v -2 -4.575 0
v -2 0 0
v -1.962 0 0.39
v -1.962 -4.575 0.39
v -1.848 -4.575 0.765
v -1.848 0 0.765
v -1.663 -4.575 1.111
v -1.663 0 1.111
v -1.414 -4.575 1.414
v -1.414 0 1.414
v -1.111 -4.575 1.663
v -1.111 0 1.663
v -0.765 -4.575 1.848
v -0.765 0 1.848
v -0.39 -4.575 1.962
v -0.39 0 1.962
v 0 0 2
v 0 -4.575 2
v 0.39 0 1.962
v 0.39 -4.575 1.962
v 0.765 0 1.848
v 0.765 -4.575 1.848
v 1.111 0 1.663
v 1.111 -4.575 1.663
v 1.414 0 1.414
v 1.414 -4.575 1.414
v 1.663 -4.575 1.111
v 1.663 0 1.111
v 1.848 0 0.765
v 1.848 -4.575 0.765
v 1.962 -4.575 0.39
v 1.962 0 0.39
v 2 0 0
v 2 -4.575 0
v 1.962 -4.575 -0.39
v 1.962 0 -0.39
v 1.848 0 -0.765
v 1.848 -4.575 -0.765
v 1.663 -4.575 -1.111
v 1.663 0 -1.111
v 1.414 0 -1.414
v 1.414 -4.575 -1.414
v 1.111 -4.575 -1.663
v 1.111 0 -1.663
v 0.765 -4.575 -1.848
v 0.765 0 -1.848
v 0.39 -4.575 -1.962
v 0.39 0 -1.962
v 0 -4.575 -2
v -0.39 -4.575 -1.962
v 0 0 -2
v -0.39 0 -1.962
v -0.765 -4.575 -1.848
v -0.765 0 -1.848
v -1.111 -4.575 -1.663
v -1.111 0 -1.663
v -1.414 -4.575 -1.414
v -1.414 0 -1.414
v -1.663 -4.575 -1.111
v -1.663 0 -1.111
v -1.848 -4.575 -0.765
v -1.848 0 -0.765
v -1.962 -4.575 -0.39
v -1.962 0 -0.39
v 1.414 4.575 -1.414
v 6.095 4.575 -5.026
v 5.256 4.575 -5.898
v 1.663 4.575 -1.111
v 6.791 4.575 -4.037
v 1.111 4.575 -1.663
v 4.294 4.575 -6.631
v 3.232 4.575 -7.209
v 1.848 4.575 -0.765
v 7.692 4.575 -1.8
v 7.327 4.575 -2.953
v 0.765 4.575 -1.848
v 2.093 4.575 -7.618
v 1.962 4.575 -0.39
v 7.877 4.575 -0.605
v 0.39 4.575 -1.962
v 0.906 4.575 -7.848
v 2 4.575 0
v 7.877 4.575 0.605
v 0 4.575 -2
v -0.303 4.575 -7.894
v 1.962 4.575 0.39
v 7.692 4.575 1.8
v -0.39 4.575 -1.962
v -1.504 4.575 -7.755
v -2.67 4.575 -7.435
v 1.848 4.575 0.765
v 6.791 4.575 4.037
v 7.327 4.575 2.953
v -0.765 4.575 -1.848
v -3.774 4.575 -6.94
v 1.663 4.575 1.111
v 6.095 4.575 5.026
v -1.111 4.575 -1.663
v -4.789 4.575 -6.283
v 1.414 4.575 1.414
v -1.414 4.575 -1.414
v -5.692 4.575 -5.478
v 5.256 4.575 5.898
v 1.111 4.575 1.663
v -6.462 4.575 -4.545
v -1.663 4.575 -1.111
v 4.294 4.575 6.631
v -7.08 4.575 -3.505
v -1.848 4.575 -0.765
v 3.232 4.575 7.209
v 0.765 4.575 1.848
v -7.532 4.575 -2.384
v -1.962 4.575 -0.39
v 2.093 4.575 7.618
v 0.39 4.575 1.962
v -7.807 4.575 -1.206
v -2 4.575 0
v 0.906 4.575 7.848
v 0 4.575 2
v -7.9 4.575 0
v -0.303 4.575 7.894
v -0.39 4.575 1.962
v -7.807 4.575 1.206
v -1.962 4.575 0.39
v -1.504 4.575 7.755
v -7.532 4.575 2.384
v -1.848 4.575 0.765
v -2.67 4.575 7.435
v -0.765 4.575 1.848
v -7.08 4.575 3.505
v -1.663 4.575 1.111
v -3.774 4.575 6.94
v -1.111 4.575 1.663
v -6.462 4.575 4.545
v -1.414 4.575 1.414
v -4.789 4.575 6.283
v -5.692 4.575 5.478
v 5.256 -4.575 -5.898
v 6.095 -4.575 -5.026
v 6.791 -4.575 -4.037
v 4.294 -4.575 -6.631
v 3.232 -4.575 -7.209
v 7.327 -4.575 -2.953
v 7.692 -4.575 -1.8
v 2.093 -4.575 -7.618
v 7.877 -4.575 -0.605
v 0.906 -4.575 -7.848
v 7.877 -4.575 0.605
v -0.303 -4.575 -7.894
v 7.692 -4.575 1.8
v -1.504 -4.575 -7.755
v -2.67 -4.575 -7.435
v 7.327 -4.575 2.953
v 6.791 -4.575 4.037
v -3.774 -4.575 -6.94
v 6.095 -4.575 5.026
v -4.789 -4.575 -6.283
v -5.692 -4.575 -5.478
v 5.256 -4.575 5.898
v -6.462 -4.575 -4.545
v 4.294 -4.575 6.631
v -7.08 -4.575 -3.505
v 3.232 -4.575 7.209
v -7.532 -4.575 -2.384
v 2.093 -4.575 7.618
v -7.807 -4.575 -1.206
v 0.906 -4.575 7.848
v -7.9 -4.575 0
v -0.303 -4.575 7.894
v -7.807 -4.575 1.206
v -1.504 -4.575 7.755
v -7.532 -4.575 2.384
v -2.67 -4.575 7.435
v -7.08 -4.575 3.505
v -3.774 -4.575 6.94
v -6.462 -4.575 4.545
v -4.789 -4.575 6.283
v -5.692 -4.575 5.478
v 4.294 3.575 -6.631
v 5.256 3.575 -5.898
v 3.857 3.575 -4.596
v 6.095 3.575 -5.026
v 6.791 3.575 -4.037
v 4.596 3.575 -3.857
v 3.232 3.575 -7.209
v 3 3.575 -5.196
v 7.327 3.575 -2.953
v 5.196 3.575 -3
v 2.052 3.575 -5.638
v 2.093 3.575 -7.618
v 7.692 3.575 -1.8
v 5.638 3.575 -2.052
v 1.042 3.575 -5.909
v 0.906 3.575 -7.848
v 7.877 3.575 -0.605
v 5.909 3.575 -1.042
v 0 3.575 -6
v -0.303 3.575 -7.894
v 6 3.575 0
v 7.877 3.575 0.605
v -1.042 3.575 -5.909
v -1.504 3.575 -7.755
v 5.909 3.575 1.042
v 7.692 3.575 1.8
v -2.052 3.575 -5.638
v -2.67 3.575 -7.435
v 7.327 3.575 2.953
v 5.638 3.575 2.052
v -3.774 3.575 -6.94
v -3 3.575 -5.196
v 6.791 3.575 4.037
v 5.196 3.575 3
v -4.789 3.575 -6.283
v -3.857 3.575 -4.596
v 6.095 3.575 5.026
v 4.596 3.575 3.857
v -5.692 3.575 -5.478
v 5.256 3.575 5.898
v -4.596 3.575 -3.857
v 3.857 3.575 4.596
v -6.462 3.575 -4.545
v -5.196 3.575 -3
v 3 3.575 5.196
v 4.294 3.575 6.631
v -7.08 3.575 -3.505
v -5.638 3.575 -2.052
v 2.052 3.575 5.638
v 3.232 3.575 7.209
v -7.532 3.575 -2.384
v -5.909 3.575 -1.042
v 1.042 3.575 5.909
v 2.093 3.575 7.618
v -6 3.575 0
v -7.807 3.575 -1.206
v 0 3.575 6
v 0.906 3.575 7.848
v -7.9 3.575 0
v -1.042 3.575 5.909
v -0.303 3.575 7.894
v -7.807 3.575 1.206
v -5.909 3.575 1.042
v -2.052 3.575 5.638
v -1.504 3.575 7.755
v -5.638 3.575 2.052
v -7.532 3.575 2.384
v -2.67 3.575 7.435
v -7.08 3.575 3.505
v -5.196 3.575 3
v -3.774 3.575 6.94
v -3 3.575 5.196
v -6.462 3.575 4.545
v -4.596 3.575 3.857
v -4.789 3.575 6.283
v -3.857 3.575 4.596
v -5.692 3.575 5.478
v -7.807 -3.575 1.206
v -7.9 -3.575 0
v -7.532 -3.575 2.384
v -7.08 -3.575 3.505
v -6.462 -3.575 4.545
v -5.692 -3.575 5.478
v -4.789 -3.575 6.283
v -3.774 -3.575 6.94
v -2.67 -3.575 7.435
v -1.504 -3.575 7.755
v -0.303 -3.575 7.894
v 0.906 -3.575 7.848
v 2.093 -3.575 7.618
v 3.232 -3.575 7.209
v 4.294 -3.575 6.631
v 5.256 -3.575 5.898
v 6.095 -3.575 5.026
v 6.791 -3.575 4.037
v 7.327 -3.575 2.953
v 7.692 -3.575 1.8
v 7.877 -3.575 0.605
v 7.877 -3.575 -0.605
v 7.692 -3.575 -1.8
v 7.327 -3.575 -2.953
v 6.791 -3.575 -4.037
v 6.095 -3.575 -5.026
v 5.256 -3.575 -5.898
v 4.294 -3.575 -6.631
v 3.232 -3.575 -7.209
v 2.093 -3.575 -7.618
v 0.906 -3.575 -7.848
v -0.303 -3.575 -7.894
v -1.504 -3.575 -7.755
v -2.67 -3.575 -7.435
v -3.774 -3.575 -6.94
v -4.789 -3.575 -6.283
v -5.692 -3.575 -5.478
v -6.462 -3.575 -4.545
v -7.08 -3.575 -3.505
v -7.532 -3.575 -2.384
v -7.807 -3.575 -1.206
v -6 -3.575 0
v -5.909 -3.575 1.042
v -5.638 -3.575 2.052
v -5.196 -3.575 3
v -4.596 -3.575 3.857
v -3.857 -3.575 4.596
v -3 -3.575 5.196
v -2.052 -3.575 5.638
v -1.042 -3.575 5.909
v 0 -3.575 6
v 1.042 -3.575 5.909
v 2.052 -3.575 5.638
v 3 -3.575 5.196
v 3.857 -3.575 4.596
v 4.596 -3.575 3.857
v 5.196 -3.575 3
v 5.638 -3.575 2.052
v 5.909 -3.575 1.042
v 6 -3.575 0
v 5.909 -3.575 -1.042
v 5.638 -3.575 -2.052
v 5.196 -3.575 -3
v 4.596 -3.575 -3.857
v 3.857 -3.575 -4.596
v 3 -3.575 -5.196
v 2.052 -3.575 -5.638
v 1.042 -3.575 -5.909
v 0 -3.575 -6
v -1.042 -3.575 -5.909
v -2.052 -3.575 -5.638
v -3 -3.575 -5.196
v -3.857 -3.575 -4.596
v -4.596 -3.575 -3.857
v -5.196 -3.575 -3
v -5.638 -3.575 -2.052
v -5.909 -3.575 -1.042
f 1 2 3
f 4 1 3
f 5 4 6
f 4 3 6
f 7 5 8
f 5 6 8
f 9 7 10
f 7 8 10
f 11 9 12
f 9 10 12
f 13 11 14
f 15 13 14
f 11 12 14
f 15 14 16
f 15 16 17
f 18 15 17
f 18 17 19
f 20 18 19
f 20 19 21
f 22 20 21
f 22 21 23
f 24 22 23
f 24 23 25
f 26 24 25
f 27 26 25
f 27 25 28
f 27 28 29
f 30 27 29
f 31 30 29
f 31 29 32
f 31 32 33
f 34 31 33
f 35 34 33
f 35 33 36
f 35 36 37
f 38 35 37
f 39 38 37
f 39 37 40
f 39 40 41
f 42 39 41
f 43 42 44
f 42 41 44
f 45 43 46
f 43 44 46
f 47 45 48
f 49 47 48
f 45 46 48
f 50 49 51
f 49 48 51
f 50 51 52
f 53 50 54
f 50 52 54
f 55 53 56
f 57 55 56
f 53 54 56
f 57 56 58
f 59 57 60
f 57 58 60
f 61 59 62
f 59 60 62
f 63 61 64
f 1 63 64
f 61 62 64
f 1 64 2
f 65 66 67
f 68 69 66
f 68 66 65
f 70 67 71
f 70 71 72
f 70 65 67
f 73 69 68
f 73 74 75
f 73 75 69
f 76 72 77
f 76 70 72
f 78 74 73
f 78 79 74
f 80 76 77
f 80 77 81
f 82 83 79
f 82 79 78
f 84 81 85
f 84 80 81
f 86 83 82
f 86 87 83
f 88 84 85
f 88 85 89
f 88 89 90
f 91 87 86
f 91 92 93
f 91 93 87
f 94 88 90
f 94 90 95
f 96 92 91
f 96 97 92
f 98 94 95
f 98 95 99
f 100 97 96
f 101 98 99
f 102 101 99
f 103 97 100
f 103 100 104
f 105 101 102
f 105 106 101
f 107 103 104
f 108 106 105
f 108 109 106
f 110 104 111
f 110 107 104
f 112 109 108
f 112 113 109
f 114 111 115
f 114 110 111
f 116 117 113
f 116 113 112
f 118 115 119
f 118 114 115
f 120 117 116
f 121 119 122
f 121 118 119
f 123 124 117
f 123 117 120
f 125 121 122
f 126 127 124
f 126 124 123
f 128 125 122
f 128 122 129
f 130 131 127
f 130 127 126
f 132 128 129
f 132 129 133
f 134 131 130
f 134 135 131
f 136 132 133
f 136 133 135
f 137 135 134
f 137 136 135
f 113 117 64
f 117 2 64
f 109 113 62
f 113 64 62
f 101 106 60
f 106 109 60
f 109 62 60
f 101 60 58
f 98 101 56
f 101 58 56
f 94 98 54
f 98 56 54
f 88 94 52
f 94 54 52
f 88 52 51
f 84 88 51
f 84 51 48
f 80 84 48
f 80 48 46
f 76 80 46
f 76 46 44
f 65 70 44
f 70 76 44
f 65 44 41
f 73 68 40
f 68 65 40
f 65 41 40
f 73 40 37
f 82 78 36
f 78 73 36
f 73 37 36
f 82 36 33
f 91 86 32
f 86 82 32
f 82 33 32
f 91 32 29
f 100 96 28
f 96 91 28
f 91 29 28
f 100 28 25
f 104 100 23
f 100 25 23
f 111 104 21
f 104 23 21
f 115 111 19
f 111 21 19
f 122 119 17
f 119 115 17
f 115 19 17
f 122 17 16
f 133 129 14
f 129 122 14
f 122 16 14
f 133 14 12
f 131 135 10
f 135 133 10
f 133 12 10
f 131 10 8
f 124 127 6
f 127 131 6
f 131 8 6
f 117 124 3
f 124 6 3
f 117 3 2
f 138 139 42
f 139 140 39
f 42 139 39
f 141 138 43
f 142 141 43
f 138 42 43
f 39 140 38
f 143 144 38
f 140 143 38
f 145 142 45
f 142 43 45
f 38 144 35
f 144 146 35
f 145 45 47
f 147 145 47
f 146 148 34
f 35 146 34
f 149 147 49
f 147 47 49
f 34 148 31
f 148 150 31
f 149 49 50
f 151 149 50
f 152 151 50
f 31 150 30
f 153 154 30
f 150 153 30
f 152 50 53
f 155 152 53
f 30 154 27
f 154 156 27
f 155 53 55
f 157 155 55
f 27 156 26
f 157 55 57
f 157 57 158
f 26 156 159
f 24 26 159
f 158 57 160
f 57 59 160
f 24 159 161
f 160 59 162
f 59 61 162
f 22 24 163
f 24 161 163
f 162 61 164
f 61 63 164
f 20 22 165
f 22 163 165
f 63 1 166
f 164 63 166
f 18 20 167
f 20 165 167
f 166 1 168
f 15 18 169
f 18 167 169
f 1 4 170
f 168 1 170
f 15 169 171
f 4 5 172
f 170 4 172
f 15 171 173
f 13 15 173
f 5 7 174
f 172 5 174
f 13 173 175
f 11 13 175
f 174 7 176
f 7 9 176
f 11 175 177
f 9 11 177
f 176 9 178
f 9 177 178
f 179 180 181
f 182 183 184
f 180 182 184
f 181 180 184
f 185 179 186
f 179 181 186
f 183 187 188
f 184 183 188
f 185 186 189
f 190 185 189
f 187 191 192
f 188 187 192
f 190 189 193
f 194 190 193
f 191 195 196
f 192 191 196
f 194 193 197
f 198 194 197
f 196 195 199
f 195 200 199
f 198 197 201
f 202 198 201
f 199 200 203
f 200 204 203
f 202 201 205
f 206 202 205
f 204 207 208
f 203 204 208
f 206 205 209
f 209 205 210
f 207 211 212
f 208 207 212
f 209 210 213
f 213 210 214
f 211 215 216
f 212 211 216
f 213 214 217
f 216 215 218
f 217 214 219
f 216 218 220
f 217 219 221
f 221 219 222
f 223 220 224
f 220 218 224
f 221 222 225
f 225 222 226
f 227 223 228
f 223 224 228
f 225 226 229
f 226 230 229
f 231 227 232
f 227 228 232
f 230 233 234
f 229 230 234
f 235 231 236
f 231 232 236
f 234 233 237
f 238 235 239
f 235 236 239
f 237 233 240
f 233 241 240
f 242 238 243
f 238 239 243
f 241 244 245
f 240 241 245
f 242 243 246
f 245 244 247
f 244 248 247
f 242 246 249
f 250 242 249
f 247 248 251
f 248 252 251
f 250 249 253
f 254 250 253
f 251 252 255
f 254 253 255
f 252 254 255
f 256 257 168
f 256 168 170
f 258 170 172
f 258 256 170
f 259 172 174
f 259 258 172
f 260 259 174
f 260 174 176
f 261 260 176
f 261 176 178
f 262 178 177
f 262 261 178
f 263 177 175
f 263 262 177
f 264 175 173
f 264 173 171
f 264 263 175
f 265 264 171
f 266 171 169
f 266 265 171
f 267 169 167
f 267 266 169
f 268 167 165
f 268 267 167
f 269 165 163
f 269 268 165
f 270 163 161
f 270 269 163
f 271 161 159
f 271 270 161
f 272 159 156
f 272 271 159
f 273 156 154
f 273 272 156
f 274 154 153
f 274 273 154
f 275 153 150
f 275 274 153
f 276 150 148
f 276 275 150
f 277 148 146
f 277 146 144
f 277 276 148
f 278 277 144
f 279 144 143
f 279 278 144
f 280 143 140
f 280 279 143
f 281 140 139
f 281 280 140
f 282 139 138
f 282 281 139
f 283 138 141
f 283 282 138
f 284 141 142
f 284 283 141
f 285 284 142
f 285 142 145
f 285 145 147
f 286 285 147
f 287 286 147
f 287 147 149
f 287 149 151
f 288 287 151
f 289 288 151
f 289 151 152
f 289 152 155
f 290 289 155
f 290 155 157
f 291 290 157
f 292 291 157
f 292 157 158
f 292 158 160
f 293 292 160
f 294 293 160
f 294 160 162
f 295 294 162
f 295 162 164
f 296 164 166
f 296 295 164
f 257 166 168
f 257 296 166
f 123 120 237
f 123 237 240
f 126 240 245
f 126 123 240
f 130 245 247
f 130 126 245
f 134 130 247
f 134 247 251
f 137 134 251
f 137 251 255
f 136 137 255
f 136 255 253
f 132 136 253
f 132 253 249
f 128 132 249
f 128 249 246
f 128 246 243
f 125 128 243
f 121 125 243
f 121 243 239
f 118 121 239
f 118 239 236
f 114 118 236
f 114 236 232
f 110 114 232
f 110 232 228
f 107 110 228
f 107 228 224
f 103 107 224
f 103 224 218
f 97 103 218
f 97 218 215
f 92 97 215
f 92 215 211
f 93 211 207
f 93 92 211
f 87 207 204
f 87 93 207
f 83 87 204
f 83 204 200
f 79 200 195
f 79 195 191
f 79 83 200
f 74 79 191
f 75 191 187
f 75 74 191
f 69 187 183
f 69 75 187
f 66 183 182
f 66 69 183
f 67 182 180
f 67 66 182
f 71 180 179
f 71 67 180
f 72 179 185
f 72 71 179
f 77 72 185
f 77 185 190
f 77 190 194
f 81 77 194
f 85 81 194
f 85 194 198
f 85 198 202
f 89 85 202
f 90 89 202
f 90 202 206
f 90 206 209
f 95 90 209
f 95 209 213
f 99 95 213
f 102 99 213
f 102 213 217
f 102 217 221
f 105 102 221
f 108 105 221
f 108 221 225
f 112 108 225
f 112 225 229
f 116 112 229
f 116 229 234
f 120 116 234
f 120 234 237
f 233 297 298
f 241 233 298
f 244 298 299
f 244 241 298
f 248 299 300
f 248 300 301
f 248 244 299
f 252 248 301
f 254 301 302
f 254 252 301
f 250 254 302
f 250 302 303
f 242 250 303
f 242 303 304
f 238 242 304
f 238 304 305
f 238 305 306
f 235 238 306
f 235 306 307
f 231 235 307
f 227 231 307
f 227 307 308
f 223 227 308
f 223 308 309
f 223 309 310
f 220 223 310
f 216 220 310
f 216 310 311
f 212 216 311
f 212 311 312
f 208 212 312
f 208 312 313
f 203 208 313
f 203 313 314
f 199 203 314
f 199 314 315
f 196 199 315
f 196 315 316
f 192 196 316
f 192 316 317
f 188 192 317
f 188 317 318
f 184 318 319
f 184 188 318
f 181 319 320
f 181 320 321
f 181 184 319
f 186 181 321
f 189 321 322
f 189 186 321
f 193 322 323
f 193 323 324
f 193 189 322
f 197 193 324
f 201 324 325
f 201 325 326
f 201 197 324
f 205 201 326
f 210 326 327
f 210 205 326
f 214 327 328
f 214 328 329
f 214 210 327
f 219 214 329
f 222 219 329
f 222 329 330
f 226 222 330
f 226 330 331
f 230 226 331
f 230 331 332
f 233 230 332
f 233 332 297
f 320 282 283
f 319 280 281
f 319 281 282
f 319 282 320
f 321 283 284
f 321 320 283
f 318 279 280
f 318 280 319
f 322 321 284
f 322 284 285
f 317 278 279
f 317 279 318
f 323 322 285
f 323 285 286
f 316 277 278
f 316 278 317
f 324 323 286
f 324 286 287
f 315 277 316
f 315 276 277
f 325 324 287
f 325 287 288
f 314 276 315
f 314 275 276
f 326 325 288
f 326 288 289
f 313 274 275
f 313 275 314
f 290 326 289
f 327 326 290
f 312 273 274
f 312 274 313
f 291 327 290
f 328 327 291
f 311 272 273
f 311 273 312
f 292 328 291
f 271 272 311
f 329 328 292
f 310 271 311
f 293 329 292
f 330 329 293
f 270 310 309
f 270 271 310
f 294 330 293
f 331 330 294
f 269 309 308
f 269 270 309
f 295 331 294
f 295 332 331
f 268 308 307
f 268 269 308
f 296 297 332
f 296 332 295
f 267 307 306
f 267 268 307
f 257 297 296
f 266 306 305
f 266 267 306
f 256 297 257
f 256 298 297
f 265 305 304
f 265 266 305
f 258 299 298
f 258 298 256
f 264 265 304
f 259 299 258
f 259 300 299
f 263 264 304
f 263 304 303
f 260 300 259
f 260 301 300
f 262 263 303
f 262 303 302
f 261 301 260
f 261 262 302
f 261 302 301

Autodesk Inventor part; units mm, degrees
ref_plane "YZ Plane" through (0, 0, 0) normal (1, 0, 0) x (0, 1, 0)
ref_plane "XZ Plane" through (0, 0, 0) normal (0, 1, 0) x (-1, 0, 0)
ref_plane "XY Plane" through (0, 0, 0) normal (0, 0, 1) x (1, 0, 0)
sketch "Эскиз1" plane through (0, 0, 0) normal (0, 1, 0) x (-1, 0, 0)
  circle A0 centre (0, 0) radius 7.9
  circle A1 centre (0, 0) radius 2
  circle A2 centre (0, 0) radius 6
  dimension "d0" = 15.8
  dimension "d1" = 4
  dimension "d4" = 12
extrude "Выдавливание1" add sketch "Эскиз1" along normal mid plane 9.15 contours A0 | A2
extrude "Выдавливание2" cut sketch "Эскиз1" along normal mid plane 7.15 contours A0
properties part number "Pulley"
